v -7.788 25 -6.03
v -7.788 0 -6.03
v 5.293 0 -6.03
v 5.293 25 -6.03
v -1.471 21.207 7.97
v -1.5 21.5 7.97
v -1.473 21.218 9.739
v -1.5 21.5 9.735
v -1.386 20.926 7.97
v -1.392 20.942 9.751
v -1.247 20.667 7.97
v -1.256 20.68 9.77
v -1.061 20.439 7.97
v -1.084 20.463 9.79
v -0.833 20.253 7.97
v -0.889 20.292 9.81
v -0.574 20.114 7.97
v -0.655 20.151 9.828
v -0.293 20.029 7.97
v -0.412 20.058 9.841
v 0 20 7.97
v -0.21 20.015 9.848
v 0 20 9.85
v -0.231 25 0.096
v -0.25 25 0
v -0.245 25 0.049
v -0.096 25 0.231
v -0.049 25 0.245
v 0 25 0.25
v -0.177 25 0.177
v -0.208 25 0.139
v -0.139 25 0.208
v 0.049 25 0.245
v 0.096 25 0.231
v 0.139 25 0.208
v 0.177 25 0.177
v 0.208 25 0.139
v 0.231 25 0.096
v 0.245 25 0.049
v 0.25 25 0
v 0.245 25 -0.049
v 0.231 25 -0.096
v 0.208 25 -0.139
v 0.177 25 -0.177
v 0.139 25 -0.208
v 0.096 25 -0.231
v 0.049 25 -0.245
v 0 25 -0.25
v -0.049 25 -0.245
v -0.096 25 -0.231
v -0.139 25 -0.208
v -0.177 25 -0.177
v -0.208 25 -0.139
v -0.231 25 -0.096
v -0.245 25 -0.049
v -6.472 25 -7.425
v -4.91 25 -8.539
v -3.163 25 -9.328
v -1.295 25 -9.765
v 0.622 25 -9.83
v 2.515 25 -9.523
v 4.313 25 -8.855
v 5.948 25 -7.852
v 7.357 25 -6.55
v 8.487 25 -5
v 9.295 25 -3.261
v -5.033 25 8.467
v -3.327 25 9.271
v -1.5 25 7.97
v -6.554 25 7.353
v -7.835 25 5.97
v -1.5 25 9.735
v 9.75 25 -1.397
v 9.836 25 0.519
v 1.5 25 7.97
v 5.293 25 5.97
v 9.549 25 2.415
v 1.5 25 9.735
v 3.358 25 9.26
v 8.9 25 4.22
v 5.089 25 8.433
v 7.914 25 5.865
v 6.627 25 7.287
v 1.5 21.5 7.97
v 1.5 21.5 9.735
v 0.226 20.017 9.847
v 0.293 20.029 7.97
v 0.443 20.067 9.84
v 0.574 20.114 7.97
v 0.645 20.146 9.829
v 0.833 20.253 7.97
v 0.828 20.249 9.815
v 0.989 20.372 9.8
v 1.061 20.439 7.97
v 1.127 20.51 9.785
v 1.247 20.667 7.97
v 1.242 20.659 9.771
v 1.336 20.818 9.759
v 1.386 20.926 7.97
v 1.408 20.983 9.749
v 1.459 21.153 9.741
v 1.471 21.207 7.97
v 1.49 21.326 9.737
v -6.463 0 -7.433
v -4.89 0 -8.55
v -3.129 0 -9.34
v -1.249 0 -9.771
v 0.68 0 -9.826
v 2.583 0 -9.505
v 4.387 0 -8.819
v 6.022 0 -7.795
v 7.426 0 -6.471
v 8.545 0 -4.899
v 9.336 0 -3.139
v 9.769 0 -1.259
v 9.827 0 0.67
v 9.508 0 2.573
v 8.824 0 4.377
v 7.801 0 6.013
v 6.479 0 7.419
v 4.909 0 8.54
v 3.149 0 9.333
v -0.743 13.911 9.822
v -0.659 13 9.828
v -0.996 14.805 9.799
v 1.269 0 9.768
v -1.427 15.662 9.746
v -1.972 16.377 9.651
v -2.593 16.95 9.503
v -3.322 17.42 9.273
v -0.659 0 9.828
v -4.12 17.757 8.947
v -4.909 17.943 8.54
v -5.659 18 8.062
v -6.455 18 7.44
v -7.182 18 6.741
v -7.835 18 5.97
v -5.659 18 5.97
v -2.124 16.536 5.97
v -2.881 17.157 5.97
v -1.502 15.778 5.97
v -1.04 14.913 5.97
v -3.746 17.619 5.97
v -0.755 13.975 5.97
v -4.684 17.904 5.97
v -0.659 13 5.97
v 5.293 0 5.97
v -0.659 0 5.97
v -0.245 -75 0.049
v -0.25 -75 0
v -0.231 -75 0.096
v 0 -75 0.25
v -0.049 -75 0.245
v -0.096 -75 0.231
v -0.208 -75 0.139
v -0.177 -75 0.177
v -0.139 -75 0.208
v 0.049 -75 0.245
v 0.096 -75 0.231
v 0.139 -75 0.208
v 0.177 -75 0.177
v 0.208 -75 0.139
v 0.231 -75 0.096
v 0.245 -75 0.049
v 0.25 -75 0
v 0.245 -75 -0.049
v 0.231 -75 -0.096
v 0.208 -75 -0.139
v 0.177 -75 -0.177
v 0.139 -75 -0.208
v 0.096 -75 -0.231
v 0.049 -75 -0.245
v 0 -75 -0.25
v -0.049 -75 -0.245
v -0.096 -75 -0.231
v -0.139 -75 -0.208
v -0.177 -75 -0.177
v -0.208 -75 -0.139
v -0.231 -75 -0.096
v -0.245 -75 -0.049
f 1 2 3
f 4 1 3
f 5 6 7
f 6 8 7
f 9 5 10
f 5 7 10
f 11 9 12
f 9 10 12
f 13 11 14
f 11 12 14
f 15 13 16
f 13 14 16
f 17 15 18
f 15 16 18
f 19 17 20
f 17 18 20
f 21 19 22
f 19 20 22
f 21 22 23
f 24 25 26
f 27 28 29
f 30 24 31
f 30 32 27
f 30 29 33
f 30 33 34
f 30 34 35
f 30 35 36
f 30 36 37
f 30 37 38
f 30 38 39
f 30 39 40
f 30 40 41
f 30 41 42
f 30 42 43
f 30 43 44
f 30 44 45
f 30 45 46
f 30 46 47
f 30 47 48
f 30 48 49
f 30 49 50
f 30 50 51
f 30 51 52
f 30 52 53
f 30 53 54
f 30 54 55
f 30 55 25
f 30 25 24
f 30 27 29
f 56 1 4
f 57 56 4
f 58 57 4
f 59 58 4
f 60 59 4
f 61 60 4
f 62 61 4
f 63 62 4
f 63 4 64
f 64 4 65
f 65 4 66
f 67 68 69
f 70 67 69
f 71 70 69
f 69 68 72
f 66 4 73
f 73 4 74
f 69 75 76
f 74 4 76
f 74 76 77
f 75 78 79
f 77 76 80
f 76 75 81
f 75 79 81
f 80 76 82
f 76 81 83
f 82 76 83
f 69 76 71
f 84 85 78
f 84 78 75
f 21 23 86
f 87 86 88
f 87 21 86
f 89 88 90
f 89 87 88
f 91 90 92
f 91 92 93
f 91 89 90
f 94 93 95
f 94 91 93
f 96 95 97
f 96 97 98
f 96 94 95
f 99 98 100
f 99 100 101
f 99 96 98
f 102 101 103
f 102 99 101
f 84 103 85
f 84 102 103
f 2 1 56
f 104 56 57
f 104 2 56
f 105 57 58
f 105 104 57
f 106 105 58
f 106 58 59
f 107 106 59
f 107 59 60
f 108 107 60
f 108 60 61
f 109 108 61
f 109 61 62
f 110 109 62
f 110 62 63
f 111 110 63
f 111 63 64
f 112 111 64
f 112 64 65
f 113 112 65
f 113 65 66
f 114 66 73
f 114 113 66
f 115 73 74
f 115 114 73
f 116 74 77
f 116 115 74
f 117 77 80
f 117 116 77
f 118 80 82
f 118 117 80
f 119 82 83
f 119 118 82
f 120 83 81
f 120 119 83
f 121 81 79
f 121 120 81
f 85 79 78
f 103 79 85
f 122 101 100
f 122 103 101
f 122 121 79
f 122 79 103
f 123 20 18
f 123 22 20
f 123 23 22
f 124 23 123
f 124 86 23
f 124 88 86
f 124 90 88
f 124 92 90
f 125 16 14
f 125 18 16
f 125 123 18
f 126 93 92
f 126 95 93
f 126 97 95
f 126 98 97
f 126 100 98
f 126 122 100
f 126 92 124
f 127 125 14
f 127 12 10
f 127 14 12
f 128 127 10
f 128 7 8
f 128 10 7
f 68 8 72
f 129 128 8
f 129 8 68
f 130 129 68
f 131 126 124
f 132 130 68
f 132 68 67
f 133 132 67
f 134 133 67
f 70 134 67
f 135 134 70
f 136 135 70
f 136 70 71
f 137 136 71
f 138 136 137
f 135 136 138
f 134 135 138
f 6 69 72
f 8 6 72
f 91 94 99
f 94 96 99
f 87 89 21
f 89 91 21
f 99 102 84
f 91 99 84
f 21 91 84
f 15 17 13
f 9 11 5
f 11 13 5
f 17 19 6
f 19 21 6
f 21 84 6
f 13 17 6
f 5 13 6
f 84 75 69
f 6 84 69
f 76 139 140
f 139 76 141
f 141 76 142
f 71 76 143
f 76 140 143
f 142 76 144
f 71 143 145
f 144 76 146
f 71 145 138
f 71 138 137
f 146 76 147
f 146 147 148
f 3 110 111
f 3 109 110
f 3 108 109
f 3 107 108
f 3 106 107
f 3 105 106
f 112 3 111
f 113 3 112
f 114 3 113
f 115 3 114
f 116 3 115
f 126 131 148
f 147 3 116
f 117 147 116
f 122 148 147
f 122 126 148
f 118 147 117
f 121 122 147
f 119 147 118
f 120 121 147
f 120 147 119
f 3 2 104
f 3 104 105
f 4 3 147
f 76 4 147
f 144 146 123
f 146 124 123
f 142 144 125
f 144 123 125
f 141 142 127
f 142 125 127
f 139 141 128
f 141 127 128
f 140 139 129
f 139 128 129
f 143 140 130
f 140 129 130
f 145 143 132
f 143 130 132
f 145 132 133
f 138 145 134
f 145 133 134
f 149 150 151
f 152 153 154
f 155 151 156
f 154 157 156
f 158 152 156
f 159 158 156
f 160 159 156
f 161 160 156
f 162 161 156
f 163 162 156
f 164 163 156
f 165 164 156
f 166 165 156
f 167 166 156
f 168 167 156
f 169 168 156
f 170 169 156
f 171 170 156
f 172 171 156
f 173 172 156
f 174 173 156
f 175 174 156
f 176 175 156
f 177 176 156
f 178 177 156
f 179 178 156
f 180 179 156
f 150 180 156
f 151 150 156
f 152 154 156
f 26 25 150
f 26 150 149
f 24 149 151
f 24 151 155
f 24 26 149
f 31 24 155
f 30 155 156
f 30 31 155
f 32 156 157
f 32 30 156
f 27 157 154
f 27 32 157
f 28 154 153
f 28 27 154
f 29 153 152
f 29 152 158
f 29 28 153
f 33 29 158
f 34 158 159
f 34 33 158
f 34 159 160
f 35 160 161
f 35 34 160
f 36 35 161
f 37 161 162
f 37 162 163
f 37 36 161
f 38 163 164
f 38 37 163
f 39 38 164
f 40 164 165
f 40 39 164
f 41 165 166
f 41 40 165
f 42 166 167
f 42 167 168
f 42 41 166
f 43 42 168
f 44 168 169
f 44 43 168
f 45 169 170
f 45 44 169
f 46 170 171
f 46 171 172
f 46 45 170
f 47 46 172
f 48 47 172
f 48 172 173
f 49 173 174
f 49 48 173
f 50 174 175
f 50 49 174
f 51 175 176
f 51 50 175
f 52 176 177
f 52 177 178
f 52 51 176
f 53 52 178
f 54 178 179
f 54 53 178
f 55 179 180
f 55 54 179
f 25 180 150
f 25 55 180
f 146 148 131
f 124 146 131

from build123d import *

# Parameters (mm, degrees)
F0_R      = 9.85
F1_DEPTH  = 25
F3_DEPTH  = 25
F5_DEPTH  = 5
F6_R      = 1.4999
F8_DEPTH  = 18
F9_R      = 5
F10_R     = 0.25
F11_DEPTH = 100


# Not quite as in the source:
# - a fillet or chamfer is up to 0.001 mm smaller than in the source, because OpenCascade refuses the exact size


with BuildPart() as f1:
    # F0 (on Front) → F1 (new body)
    with BuildSketch(Plane.XZ):
        Circle(F0_R)
    extrude(amount=-F1_DEPTH)

    # F2 (on face) → F3 (cut)
    with BuildSketch(Plane.XZ):
        with BuildLine():
            Line((5.2929249124, 5.9699154869), (-7.8347054239, 5.9699154869))
            ThreePointArc((-7.8347054239, 5.9699154869), (-9.8499269521, -0.0379346534), (-7.788490275, -6.0300845131))
            Line((-7.788490275, -6.0300845131), (5.2929249124, -6.0300845131))
            Line((5.2929249124, -6.0300845131), (5.2929249124, 5.9699154869))
        make_face()
    extrude(amount=-F3_DEPTH, mode=Mode.SUBTRACT)

    # F4 (on face) → F5 (cut)
    with BuildSketch(Plane(origin=(0, 25, 0), x_dir=(-1, 0, 0), z_dir=(0, 1, 0))):
        with BuildLine():
            ThreePointArc((1.5, 9.7351168457), (0, 9.85), (-1.5, 9.7351168457))
            Line((-1.5, 9.7351168457), (-1.5, 7.9699154869))
            Line((-1.5, 7.9699154869), (1.5, 7.9699154869))
            Line((1.5, 7.9699154869), (1.5, 9.7351168457))
        make_face()
    extrude(amount=-F5_DEPTH, mode=Mode.SUBTRACT)

    # F6 (radius 1.5 in the source; OpenCascade refuses exactly that, so slightly less here)
    f6_edges = [f1.edges().sort_by_distance(p)[0] for p in [
        (-1.5, 20, 8.852516),
        (1.5, 20, 8.852516),
    ]]
    fillet(f6_edges, radius=F6_R)

    # F7 (on face) → F8 (cut)
    with BuildSketch(Plane.XZ):
        with BuildLine():
            Line((-0.6592699745, 5.9699154869), (-0.6592699745, 9.8279124488))
            ThreePointArc((-0.6592699745, 9.8279124488), (-4.6645406694, 8.6755149901), (-7.8347054239, 5.9699154869))
            Line((-7.8347054239, 5.9699154869), (-0.6592699745, 5.9699154869))
        make_face()
    extrude(amount=-F8_DEPTH, mode=Mode.SUBTRACT)

    # F9
    f9_edges = [f1.edges().sort_by_distance(p)[0] for p in [
        (-0.65927, 18, 7.898914),
    ]]
    fillet(f9_edges, radius=F9_R)


with BuildPart() as f11:
    # F10 (on face) → F11 (new body)
    with BuildSketch(Plane(origin=(0, 25, 0), x_dir=(-1, 0, 0), z_dir=(0, 1, 0))):
        Circle(F10_R)
    extrude(amount=-F11_DEPTH)


solid = Compound([f1.part, f11.part])
